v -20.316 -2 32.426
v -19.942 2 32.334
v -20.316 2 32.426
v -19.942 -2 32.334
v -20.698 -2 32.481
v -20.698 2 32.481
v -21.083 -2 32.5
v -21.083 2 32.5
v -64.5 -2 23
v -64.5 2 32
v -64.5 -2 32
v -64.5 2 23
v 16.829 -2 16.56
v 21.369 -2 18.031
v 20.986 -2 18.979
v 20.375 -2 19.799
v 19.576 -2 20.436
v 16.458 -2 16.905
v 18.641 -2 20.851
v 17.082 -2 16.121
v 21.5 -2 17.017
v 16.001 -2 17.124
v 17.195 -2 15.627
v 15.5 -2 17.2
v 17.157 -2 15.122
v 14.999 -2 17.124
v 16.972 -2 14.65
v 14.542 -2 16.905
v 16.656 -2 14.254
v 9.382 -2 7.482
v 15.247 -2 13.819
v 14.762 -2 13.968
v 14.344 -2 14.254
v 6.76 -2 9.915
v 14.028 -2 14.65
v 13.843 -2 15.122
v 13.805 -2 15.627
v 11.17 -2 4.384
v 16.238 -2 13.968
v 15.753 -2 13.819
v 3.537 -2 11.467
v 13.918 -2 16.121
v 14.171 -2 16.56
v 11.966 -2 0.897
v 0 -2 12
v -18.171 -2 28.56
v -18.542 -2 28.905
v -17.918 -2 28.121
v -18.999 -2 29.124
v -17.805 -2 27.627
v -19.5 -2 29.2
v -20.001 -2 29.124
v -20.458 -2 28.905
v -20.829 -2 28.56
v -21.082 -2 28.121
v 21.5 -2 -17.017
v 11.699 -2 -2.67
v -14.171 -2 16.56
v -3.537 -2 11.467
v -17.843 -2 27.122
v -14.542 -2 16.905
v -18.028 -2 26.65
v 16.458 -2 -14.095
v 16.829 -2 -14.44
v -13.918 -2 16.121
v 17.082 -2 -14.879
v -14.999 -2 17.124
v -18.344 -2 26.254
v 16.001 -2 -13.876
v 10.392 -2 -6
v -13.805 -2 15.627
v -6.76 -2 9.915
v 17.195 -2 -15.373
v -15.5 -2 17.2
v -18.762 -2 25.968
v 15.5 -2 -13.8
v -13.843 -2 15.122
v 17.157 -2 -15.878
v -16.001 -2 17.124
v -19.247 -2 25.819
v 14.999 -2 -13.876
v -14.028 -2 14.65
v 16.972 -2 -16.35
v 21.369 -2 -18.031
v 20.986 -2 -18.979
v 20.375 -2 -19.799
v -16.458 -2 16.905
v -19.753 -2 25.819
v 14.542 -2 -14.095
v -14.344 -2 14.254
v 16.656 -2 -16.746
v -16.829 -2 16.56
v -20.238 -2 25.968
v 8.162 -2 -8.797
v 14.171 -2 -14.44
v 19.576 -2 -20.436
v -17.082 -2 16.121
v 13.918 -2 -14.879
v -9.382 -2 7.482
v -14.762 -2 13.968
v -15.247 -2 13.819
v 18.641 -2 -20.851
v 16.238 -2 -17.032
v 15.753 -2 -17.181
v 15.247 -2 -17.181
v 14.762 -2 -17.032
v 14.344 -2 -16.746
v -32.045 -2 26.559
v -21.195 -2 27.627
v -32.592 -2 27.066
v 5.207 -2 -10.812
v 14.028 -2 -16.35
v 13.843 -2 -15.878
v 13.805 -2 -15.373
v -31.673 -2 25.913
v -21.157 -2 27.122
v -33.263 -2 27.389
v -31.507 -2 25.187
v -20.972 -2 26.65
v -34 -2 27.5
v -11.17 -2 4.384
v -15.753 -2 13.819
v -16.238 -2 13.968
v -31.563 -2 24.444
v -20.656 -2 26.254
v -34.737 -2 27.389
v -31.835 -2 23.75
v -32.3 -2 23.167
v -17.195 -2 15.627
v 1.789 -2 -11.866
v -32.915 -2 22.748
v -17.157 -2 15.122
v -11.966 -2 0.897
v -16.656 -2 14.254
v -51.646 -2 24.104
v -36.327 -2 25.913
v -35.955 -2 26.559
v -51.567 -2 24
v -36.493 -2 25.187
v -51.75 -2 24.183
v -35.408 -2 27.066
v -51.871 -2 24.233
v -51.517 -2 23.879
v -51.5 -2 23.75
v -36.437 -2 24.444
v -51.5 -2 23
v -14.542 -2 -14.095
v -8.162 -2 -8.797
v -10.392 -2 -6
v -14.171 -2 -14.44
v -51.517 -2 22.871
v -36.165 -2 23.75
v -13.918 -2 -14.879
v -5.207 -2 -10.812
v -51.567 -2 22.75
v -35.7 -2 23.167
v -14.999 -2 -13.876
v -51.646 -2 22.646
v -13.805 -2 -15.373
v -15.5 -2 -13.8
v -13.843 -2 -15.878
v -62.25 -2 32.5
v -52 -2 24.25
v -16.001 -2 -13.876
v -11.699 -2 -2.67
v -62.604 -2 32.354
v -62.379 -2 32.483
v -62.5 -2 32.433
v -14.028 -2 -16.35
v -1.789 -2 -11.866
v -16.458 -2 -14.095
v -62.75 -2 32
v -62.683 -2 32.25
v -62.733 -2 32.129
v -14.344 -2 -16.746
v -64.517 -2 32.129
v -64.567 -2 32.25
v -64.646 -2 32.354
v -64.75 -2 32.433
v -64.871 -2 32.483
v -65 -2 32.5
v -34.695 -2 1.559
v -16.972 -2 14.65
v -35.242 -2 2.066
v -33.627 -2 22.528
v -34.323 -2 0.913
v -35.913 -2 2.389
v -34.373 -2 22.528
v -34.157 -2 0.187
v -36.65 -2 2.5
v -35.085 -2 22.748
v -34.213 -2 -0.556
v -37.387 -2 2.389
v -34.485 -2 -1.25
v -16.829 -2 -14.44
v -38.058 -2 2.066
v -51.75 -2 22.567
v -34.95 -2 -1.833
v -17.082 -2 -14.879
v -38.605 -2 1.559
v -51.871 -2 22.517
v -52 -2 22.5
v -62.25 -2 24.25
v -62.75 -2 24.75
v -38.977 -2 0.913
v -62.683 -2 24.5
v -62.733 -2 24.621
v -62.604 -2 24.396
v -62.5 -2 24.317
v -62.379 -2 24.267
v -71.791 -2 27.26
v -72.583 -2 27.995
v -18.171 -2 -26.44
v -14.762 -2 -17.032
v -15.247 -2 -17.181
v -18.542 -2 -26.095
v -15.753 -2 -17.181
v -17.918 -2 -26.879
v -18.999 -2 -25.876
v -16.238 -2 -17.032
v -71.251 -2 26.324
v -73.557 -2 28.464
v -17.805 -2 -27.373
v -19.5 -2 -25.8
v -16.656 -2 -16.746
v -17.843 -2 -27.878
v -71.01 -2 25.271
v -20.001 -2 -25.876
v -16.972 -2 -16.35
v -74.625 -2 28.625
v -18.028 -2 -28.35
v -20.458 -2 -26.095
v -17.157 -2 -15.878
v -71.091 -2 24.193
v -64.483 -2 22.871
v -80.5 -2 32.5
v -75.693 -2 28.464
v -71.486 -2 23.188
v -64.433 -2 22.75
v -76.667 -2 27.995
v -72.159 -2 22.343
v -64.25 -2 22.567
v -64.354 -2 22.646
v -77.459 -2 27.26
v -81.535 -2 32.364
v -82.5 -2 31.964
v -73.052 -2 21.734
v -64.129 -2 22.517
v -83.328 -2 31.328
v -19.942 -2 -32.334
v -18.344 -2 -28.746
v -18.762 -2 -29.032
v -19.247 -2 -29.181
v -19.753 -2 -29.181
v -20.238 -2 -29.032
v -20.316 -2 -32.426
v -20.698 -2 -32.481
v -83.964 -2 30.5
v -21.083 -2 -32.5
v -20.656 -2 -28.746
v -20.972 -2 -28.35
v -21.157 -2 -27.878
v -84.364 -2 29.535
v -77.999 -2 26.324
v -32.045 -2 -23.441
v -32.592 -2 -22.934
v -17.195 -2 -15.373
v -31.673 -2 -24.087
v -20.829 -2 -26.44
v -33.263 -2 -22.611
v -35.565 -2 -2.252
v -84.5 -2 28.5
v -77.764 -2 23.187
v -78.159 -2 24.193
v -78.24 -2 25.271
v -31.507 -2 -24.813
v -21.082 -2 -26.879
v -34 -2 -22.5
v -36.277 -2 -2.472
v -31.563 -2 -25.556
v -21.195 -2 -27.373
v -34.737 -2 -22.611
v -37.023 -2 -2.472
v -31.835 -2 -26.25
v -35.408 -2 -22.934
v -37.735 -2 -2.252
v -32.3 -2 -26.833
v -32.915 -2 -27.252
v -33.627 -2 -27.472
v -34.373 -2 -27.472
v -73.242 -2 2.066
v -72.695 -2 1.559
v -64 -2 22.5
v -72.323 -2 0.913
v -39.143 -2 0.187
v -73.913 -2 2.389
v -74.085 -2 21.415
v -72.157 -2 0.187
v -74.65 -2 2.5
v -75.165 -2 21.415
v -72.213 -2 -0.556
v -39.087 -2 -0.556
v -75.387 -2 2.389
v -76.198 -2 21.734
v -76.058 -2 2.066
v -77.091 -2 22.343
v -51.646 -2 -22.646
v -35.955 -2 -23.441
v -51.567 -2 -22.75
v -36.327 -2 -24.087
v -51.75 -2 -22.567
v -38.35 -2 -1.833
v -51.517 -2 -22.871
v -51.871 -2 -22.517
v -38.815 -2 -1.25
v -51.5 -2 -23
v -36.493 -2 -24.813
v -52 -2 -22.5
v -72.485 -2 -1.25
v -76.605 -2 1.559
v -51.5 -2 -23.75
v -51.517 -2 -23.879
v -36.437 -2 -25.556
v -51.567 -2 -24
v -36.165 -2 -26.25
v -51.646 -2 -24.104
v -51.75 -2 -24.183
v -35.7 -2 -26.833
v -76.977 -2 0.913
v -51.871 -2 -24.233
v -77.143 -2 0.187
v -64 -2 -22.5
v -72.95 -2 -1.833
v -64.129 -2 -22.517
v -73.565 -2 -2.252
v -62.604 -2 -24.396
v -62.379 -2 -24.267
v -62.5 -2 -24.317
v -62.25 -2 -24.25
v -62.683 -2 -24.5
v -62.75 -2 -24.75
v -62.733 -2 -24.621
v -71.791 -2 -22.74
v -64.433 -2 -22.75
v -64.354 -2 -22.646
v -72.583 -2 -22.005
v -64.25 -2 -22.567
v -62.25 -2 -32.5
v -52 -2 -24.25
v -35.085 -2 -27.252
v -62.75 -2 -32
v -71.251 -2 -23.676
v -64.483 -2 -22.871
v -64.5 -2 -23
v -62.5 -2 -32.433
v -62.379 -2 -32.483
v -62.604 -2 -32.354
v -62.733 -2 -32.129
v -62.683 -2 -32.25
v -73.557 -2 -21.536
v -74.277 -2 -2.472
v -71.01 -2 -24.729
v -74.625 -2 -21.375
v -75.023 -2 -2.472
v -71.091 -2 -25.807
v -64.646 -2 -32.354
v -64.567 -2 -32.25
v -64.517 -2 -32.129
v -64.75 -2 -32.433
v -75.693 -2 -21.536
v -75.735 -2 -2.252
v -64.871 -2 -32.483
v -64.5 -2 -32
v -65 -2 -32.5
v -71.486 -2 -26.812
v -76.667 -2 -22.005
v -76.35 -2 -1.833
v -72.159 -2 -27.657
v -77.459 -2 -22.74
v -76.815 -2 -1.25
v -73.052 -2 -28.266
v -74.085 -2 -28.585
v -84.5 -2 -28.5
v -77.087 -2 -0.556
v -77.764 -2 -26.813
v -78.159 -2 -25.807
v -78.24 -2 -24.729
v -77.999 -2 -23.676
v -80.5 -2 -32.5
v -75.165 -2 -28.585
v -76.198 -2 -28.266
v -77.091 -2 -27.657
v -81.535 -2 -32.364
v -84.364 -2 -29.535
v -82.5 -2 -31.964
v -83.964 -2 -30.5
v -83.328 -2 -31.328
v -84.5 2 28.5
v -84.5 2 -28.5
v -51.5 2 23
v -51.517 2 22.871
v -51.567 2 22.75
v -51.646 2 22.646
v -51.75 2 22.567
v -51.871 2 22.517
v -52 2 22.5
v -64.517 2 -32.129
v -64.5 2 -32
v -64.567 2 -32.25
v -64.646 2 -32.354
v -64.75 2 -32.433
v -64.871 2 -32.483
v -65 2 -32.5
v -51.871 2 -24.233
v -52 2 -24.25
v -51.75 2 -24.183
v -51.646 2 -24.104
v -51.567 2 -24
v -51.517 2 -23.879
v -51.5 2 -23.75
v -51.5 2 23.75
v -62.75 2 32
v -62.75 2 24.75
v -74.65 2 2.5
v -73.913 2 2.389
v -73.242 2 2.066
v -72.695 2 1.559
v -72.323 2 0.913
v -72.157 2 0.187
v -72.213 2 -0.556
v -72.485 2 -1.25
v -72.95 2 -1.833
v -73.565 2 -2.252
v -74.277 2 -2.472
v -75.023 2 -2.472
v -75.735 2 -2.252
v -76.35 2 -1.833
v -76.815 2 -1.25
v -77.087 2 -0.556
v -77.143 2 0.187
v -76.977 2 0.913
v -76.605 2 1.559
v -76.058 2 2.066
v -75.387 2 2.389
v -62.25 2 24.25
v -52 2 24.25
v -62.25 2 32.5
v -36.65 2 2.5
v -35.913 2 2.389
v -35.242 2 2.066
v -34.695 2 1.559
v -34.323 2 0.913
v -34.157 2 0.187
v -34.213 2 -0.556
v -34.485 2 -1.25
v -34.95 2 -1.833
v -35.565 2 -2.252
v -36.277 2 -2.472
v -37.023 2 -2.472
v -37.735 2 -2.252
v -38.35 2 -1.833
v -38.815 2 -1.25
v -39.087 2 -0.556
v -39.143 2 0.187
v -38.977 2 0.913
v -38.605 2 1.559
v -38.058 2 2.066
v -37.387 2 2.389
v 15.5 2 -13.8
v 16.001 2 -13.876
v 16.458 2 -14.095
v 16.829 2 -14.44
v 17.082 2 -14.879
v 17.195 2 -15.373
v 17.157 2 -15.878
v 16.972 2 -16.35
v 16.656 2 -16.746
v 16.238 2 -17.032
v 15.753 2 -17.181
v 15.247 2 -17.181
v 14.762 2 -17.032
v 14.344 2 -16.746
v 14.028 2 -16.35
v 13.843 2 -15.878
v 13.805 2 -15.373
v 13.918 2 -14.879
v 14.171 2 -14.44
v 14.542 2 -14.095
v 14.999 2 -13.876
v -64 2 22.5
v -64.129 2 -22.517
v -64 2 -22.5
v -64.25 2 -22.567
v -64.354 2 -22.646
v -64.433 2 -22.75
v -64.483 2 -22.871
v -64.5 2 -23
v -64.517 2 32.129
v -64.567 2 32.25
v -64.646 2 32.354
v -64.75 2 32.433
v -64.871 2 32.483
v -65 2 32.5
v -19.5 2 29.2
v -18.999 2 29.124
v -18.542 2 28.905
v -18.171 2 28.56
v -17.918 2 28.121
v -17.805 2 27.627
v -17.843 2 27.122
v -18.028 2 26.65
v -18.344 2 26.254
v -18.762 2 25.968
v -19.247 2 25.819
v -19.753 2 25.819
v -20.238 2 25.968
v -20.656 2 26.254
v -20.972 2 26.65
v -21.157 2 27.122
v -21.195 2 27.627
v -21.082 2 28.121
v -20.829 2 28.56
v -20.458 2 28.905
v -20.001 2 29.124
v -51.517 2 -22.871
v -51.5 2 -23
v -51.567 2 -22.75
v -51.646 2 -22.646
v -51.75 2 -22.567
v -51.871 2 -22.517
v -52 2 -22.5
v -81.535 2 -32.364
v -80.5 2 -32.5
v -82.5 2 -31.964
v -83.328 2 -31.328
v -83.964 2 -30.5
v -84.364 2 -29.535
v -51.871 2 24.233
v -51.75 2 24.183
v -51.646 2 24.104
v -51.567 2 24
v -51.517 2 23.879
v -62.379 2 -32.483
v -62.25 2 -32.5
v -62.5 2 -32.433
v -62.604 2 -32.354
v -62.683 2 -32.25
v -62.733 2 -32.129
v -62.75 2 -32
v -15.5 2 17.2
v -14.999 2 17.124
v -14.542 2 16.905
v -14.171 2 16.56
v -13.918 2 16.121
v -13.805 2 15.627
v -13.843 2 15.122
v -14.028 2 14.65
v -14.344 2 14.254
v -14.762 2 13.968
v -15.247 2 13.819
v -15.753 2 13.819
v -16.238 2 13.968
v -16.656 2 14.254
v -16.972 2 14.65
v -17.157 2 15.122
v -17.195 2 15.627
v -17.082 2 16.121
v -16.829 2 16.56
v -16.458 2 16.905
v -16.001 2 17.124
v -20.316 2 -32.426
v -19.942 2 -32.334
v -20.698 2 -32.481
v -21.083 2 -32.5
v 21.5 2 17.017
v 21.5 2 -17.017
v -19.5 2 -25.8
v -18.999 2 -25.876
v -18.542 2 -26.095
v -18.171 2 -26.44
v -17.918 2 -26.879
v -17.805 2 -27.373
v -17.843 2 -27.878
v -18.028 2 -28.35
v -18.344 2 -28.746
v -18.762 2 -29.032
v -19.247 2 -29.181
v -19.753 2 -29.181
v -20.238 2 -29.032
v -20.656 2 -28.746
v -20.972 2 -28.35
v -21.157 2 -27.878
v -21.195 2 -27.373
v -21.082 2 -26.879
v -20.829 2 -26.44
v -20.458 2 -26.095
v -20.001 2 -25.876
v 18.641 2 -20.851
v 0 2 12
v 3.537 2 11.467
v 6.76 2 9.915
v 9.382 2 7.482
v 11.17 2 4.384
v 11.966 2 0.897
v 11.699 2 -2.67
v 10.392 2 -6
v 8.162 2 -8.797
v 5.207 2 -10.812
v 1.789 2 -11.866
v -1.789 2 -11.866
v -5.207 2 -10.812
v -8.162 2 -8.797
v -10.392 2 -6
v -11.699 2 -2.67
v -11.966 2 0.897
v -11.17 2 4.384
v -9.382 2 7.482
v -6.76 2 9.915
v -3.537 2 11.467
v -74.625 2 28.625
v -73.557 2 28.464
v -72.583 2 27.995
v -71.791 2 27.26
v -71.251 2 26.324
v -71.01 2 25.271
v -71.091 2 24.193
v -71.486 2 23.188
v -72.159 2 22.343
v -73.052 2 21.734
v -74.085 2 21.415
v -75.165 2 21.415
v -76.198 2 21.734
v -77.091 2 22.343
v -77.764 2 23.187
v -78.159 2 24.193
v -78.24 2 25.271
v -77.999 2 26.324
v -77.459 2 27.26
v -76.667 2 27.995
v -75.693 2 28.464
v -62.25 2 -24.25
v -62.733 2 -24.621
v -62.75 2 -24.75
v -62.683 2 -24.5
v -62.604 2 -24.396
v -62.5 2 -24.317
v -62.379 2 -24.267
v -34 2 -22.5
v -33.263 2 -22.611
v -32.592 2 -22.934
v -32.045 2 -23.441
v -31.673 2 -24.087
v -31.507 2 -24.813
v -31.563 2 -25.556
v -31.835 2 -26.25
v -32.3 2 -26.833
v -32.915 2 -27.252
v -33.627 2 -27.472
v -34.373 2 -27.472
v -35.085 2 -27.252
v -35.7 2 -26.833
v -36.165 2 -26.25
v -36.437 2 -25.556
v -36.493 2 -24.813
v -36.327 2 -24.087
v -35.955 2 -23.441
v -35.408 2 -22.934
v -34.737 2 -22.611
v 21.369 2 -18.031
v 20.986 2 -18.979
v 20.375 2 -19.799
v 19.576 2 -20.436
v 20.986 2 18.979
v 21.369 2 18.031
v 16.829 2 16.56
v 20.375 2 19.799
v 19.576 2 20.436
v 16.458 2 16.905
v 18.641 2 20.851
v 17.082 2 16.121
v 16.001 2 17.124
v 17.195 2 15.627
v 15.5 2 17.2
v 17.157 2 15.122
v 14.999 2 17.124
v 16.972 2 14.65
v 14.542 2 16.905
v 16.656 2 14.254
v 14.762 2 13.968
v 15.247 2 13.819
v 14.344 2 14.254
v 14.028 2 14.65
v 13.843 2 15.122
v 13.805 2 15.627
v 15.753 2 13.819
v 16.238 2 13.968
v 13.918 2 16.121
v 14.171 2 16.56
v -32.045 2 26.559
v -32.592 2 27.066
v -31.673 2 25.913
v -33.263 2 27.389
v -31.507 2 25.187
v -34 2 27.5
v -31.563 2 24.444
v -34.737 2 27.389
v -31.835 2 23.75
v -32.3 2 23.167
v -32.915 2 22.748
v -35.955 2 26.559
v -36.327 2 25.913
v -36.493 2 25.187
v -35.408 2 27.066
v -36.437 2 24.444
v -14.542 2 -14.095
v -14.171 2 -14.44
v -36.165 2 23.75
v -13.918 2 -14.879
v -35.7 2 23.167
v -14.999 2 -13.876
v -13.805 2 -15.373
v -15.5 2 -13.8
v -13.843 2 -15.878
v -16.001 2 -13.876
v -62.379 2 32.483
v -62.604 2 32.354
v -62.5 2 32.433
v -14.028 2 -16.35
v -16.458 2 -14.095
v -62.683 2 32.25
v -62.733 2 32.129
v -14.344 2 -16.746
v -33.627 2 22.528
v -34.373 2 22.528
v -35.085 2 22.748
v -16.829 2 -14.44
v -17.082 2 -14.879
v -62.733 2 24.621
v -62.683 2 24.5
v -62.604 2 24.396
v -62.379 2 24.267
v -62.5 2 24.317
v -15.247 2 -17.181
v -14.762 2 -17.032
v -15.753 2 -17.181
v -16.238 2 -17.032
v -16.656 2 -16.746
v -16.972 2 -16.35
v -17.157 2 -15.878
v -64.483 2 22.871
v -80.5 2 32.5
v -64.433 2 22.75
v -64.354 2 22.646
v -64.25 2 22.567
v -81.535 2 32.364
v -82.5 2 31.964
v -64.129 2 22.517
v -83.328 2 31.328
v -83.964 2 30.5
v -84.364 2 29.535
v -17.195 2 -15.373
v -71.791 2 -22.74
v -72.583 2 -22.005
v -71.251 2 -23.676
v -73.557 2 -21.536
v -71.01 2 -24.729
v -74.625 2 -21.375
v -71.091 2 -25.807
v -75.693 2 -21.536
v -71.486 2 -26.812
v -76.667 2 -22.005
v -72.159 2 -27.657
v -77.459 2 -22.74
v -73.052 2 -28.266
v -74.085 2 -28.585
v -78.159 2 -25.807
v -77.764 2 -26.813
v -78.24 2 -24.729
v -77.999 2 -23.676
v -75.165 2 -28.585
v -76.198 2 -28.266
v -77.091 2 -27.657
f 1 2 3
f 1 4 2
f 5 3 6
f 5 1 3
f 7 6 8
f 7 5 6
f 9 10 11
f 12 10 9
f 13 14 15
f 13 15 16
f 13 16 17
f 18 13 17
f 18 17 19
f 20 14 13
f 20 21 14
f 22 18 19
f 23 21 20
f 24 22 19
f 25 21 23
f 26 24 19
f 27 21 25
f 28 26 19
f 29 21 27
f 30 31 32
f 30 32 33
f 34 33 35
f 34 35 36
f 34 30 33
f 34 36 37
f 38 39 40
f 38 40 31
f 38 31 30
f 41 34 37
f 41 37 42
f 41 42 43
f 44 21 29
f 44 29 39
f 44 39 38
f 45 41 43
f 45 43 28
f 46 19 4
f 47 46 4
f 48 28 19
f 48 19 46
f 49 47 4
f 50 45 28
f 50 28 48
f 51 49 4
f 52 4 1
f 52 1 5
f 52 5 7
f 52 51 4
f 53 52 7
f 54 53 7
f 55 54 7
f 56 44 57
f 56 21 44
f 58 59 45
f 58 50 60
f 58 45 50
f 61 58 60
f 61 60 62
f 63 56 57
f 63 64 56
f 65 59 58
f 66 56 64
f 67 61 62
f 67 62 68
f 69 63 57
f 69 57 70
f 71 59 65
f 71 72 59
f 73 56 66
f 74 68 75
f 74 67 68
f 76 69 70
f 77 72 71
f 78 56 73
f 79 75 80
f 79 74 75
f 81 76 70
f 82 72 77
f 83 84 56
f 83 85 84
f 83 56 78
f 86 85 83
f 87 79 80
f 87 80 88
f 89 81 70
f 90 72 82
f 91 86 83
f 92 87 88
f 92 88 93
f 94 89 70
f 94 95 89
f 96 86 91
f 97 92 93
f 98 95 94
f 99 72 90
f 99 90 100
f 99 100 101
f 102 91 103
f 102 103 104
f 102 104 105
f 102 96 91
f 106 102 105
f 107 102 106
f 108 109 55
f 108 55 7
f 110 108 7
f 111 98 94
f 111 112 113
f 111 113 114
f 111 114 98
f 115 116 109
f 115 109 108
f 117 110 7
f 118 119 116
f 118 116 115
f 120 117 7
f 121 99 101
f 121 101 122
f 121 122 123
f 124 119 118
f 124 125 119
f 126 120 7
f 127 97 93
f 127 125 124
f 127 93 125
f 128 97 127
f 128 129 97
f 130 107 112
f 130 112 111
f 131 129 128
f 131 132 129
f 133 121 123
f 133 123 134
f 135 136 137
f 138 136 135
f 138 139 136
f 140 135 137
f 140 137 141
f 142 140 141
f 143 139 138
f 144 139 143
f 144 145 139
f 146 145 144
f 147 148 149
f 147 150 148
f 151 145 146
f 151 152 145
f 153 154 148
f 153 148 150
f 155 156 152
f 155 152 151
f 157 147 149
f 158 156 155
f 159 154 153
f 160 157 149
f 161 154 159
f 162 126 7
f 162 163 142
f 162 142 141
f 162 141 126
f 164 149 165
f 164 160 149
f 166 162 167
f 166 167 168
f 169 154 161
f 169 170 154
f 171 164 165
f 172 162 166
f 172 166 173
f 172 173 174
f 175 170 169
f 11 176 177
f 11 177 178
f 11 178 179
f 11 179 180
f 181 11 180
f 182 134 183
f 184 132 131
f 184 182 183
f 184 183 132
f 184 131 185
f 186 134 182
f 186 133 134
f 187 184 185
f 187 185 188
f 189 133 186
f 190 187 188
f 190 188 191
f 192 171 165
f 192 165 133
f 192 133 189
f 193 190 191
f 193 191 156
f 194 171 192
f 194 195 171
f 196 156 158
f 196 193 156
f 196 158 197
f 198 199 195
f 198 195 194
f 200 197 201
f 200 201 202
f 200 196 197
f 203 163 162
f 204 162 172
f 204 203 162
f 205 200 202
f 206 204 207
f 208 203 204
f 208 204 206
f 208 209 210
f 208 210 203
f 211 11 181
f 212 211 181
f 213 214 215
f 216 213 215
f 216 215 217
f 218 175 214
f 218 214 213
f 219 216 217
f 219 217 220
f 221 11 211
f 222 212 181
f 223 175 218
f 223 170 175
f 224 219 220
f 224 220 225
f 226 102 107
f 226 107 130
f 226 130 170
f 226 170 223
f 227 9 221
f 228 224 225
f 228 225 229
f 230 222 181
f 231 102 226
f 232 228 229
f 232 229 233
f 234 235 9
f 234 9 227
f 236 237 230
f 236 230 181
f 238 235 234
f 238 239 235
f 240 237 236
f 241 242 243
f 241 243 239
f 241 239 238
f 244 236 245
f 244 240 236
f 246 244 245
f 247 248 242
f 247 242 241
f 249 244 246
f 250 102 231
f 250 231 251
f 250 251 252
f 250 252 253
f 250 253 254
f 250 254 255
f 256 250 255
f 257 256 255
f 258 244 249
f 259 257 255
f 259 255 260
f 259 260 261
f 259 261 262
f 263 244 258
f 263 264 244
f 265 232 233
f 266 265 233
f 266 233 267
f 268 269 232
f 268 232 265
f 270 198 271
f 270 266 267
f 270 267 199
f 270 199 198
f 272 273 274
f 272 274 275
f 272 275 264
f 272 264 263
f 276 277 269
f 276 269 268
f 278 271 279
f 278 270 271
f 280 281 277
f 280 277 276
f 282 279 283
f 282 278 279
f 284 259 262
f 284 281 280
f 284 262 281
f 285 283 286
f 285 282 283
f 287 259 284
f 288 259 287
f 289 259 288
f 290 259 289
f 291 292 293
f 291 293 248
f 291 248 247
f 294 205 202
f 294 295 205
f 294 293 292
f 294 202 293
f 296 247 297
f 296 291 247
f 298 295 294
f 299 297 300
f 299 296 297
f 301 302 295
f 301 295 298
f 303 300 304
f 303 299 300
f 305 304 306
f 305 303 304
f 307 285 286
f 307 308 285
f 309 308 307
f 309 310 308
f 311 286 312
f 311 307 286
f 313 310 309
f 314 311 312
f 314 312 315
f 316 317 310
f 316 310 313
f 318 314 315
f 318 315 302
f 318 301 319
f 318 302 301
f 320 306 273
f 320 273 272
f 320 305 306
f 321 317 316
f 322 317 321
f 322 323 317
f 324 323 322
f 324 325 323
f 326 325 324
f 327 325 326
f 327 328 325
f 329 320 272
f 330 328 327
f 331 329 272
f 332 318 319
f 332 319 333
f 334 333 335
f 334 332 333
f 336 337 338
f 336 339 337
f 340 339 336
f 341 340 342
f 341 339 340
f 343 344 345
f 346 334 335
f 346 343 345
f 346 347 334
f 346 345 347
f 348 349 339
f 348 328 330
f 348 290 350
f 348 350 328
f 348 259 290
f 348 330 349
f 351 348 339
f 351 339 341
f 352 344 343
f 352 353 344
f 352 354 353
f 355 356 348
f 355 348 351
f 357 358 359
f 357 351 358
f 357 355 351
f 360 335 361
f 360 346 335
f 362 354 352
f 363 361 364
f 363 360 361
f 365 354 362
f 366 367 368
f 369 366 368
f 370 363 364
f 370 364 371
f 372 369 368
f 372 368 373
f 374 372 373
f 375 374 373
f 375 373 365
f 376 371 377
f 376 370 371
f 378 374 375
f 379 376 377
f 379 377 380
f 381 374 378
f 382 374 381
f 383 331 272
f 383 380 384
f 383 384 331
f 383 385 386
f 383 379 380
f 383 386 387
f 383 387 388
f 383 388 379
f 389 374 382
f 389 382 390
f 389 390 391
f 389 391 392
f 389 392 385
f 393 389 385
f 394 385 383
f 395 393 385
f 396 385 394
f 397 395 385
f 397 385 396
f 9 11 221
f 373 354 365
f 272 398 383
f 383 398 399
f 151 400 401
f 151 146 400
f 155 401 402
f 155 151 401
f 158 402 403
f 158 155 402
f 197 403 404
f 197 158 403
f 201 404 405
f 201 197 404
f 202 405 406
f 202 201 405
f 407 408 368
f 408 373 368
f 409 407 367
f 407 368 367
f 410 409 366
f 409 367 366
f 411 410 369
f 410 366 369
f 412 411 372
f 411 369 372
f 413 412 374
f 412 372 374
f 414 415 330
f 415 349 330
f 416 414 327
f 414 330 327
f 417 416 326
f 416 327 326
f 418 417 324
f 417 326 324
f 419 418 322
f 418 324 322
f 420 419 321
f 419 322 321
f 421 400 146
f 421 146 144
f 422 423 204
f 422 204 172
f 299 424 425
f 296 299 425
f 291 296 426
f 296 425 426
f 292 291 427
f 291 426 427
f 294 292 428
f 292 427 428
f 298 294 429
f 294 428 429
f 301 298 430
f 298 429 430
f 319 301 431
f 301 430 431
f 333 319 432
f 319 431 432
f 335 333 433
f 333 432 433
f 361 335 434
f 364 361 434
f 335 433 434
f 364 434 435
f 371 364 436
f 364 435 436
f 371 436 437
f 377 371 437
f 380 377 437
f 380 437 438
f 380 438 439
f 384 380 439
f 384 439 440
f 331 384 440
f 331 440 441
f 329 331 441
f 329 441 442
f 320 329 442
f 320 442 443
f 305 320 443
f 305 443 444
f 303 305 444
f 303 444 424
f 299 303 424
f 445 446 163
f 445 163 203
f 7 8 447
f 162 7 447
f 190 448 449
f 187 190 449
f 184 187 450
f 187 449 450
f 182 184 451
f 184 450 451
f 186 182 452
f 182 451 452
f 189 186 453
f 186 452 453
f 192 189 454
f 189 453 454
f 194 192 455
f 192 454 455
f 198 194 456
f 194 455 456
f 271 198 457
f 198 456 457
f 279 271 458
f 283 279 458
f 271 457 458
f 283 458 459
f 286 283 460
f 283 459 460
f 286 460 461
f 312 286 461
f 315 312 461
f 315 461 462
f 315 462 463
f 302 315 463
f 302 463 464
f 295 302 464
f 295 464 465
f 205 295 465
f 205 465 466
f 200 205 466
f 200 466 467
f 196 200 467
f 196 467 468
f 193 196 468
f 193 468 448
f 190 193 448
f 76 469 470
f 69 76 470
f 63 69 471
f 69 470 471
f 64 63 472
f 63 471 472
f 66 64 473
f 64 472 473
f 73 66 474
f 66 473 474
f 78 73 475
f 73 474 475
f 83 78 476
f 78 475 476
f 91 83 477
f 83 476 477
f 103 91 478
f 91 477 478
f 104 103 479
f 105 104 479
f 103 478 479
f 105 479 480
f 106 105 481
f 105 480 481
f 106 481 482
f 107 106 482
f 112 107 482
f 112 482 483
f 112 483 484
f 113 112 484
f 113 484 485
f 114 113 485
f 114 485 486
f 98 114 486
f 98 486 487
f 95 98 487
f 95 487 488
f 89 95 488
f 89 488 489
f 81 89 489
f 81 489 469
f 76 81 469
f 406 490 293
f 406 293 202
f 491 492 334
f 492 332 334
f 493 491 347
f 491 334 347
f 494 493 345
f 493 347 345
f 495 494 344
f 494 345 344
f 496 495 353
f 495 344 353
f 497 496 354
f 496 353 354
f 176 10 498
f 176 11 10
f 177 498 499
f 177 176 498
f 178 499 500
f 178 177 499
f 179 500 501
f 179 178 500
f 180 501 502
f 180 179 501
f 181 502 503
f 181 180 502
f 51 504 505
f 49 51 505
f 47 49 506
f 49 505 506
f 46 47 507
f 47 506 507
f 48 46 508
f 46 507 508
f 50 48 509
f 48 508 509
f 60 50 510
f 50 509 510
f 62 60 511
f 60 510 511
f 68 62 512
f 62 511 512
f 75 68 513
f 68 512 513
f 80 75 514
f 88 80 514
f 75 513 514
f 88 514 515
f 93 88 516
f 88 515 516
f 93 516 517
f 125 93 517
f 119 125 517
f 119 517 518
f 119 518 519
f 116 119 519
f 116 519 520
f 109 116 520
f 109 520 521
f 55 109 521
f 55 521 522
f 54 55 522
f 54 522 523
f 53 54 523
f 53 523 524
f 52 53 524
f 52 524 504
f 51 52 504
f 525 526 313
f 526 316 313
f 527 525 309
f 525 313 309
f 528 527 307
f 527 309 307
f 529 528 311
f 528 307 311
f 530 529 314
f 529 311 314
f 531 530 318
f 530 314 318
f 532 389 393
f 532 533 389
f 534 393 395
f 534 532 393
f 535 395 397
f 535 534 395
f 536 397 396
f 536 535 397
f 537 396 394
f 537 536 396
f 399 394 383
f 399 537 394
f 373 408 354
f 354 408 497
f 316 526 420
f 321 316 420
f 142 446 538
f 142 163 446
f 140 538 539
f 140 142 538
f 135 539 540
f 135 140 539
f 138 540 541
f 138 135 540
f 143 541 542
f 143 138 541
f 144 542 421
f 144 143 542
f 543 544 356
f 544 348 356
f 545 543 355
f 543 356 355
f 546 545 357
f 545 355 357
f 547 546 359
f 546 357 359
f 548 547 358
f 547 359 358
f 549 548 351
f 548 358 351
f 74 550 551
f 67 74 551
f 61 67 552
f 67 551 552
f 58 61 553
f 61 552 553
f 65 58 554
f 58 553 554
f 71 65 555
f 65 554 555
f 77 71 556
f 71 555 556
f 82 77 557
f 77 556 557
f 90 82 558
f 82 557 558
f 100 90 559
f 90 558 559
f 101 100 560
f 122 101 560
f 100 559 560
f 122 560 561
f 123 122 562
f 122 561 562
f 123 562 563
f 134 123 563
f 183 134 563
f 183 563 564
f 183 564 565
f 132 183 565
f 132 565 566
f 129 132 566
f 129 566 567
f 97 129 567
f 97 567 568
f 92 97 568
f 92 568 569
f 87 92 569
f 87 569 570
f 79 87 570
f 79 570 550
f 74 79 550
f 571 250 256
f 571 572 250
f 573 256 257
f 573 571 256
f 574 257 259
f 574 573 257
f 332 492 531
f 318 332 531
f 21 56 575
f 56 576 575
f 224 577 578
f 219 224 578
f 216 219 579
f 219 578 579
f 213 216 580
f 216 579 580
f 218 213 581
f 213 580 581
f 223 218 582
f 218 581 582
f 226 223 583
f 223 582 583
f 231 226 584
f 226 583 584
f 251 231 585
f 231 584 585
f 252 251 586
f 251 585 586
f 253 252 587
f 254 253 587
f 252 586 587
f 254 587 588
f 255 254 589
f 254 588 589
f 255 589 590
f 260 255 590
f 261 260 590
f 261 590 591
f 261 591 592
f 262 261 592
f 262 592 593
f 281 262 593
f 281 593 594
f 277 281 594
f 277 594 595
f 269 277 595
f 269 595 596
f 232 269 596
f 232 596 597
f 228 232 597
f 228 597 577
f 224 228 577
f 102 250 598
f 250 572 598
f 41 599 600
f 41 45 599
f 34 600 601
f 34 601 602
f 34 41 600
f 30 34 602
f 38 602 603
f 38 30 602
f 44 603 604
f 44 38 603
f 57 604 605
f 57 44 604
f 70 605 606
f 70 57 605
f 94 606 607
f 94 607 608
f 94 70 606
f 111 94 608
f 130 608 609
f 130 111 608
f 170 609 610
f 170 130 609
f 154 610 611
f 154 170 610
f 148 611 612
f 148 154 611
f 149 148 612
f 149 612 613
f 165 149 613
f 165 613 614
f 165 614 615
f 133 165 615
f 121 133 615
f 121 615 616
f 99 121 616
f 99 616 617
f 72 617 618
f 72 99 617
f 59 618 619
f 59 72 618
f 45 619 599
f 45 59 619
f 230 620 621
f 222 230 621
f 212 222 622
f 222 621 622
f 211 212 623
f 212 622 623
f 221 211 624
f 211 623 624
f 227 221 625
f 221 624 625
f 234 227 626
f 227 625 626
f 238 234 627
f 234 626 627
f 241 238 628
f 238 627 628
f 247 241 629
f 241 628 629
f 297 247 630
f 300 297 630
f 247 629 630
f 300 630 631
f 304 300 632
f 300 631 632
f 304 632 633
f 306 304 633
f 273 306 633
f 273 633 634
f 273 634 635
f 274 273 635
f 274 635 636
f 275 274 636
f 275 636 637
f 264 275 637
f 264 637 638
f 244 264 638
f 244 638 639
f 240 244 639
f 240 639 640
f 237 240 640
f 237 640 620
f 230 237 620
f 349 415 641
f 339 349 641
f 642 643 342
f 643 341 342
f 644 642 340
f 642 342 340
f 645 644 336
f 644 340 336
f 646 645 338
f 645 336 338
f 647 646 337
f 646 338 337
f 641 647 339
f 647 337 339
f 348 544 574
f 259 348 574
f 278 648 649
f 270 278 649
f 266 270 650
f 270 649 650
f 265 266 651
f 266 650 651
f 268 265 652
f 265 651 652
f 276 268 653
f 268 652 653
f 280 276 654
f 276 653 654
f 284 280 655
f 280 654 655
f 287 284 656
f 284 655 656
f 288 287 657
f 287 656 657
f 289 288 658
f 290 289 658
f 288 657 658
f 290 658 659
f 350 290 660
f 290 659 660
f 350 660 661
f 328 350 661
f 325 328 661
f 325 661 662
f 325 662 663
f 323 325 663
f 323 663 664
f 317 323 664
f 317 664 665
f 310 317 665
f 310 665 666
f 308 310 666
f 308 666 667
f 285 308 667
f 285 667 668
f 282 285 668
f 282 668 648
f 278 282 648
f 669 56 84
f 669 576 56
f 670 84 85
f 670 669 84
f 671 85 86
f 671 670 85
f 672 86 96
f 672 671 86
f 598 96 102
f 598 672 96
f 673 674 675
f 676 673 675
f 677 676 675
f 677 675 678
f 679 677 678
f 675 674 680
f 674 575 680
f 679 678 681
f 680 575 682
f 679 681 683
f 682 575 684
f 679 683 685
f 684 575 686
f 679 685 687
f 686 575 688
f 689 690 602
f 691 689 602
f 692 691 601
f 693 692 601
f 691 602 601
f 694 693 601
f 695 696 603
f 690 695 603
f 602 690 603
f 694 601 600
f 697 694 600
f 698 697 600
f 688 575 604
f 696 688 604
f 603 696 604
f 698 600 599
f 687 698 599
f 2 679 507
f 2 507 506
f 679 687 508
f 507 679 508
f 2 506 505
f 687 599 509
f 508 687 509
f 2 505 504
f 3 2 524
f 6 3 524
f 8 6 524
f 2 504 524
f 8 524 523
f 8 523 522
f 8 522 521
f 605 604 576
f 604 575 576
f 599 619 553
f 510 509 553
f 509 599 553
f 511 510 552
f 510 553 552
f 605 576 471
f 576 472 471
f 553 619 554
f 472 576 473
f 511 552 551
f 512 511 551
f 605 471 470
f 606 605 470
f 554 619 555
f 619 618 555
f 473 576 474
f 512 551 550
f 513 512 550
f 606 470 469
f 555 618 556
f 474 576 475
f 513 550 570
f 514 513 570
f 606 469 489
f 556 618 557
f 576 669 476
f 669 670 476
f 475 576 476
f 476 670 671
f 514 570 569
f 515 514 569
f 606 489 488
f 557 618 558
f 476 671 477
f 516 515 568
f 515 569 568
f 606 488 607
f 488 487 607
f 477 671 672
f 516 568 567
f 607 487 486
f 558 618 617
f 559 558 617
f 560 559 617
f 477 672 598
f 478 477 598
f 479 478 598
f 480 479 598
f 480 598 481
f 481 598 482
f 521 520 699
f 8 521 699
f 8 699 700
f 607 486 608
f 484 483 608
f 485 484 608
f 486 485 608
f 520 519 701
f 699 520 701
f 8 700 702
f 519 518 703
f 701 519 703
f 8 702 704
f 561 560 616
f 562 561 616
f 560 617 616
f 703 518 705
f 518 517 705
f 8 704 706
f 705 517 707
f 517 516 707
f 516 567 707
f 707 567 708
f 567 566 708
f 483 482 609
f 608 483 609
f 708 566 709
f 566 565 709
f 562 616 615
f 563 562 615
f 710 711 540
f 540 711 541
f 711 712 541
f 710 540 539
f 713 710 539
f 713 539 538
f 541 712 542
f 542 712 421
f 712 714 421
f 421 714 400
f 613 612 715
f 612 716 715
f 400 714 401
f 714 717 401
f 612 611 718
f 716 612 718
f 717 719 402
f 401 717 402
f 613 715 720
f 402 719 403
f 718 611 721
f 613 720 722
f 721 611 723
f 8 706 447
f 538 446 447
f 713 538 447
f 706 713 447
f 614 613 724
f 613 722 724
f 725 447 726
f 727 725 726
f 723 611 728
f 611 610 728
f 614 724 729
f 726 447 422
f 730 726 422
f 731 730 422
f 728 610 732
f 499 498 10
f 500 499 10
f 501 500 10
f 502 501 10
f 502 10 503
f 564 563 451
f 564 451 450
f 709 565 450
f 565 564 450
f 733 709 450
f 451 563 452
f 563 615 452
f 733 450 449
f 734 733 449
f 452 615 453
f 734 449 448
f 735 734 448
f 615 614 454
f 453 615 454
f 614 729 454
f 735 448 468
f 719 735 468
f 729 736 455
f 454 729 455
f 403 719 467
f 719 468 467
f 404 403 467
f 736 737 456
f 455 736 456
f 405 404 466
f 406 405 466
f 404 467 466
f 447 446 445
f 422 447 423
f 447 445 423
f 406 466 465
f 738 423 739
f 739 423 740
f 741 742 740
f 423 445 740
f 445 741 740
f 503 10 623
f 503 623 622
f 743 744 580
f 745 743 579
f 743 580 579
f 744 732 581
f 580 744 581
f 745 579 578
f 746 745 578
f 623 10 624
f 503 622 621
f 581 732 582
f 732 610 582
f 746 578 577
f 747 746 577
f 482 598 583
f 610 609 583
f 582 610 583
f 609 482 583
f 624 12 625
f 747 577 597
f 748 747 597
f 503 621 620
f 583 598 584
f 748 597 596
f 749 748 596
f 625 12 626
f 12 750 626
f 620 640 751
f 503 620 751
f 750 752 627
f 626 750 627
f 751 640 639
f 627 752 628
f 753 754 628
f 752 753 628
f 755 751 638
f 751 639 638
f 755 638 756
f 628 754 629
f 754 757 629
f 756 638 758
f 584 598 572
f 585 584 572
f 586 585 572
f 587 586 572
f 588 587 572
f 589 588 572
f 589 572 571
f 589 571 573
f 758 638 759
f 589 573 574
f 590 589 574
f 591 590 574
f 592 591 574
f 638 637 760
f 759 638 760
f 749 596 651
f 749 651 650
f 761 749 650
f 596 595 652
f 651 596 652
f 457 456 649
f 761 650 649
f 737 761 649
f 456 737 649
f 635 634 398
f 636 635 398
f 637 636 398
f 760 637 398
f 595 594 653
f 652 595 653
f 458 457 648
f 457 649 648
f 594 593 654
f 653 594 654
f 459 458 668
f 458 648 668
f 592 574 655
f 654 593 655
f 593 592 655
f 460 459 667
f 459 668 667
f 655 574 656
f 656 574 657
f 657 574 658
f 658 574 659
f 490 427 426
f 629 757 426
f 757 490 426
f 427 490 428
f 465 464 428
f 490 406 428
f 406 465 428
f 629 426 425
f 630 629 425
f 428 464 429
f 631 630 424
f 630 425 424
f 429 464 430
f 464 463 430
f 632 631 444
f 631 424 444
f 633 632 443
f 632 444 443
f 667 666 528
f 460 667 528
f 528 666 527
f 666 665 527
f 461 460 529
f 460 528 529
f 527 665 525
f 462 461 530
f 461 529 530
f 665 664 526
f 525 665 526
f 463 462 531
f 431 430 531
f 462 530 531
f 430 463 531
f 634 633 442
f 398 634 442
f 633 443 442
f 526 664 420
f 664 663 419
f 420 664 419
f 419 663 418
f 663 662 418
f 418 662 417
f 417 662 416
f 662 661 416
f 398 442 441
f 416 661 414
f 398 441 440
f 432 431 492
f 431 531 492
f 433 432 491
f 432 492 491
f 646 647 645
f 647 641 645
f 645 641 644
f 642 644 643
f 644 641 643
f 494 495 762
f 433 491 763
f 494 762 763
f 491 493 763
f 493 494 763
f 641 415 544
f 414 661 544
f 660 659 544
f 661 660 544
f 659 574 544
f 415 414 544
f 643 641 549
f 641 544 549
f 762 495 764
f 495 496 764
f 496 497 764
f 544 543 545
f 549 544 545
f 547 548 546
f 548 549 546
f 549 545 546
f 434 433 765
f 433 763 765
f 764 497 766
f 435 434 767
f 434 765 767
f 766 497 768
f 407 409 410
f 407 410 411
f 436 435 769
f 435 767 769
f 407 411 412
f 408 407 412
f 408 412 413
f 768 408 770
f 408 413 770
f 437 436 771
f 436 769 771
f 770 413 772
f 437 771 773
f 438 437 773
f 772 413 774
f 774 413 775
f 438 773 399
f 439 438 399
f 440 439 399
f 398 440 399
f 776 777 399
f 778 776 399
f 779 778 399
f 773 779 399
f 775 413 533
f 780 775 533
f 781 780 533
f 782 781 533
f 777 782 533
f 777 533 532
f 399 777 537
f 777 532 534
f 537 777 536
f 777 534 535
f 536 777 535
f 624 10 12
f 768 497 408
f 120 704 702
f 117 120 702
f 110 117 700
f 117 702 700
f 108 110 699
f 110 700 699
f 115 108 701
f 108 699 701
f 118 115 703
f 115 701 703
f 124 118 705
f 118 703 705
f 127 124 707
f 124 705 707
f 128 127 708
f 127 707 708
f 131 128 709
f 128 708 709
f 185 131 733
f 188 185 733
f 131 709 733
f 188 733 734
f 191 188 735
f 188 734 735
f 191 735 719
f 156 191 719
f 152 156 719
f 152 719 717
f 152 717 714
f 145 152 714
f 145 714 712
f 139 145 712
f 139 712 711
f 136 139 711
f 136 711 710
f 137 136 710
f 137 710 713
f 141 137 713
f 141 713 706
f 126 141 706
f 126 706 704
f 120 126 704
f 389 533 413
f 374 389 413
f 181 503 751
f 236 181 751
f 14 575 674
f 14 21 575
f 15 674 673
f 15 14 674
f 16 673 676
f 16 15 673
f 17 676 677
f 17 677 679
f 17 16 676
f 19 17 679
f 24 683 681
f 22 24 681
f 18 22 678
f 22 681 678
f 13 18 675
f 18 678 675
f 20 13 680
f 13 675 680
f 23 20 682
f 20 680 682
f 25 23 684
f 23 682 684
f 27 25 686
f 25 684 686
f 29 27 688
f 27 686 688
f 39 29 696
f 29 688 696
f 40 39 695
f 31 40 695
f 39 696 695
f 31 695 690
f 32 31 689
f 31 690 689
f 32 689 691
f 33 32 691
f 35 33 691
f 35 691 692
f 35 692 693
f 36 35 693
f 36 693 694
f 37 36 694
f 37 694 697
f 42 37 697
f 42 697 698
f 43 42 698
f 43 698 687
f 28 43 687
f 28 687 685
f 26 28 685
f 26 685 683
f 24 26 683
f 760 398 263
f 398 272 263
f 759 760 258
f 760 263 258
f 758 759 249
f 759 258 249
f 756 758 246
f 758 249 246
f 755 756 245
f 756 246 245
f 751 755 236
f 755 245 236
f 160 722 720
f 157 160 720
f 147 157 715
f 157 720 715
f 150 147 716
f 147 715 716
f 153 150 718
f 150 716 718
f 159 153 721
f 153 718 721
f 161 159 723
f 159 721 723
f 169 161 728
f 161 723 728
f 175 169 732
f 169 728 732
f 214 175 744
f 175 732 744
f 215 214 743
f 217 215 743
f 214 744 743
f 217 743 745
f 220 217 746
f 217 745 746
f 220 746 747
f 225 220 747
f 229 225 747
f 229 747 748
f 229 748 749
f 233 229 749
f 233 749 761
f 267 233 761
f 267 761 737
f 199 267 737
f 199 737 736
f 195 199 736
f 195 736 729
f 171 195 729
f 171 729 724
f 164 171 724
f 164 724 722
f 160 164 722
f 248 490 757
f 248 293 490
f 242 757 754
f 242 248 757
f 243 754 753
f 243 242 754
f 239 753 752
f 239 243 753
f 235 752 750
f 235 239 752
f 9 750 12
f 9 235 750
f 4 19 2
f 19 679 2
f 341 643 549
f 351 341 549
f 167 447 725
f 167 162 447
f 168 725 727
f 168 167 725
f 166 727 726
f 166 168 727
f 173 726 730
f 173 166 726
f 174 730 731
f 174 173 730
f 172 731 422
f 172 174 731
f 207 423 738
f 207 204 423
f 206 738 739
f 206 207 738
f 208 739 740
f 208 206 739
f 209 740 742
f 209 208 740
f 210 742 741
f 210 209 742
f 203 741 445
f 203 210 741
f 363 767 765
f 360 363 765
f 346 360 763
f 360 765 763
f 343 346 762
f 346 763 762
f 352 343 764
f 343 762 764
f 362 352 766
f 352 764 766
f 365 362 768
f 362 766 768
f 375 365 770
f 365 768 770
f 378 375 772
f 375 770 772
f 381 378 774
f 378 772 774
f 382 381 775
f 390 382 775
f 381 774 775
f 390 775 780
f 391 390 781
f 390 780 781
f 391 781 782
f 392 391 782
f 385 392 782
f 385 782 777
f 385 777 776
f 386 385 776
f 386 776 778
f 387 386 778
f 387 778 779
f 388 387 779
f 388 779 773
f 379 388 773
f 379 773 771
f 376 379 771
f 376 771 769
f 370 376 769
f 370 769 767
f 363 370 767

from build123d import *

# Parameters (mm, degrees)
SKETCH1_R           = 12
BOSS_EXTRUDE1_DEPTH = 2
SKETCH2_R           = 1.7
CUT_EXTRUDE1_DEPTH  = 91.622844802
SKETCH3_R           = 2.5
SKETCH3_R_2         = 3.625
CUT_EXTRUDE2_DEPTH  = 91.622844802
CUT_EXTRUDE3_DEPTH  = 91.622844802
FILLET1_R           = 4
FILLET2_R           = 0.5


with BuildPart() as part:
    # Sketch1 → Boss-Extrude1 (new, symmetric)
    with BuildSketch(Plane(origin=(0, 0, 0), x_dir=(1, 0, 0), z_dir=(0, 1, 0))):
        Polygon((21.5, 20), (21.5, -20), (-20.5, -32.5), (-84.5, -32.5), (-84.5, 32.5), (-20.5, 32.5), align=None)
        with Locations(Location((0, 0, 0), (0, 0, 270))):
            Circle(SKETCH1_R, mode=Mode.SUBTRACT)
    extrude(amount=BOSS_EXTRUDE1_DEPTH, both=True)

    # Sketch2 → Cut-Extrude1 (cut, through all)
    with BuildSketch(Plane(origin=(0, 2, 0), x_dir=(1, 0, 0), z_dir=(0, 1, 0))):
        with Locations(Location((15.5, 15.5, 0), (0, 0, 270))):
            Circle(SKETCH2_R)
        with Locations(Location((-15.5, 15.5, 0), (0, 0, 270))):
            Circle(SKETCH2_R)
        with Locations(Location((-15.5, -15.5, 0), (0, 0, 270))):
            Circle(SKETCH2_R)
        with Locations(Location((15.5, -15.5, 0), (0, 0, 270))):
            Circle(SKETCH2_R)
        with Locations(Location((-19.5, 27.5, 0), (0, 0, 270))):
            Circle(SKETCH2_R)
        with Locations(Location((-19.5, -27.5, 0), (0, 0, 270))):
            Circle(SKETCH2_R)
    extrude(amount=-CUT_EXTRUDE1_DEPTH, mode=Mode.SUBTRACT)

    # Sketch3 → Cut-Extrude2 (cut, through all)
    with BuildSketch(Plane(origin=(0, 2, 0), x_dir=(1, 0, 0), z_dir=(0, 1, 0))):
        with Locations(Location((-74.65, 0, 0), (0, 0, 270))):
            Circle(SKETCH3_R)
        with Locations(Location((-36.65, 0, 0), (0, 0, 270))):
            Circle(SKETCH3_R)
        with Locations(Location((-34, 25, 0), (0, 0, 270))):
            Circle(SKETCH3_R)
        with Locations(Location((-34, -25, 0), (0, 0, 270))):
            Circle(SKETCH3_R)
        with Locations(Location((-74.625, 25, 0), (0, 0, 270))):
            Circle(SKETCH3_R_2)
        with Locations(Location((-74.625, -25, 0), (0, 0, 270))):
            Circle(SKETCH3_R_2)
    extrude(amount=-CUT_EXTRUDE2_DEPTH, mode=Mode.SUBTRACT)

    # Sketch4 → Cut-Extrude3 (cut, through all)
    with BuildSketch(Plane(origin=(0, 2, 0), x_dir=(1, 0, 0), z_dir=(0, 1, 0))):
        Polygon((-64.5, 32.5), (-64.5, 22.5), (-51.5, 22.5), (-51.5, 24.25), (-62.75, 24.25), (-62.75, 32.5), align=None)
        Polygon((-62.75, -24.25), (-62.75, -32.5), (-64.5, -32.5), (-64.5, -22.5), (-51.5, -22.5), (-51.5, -24.25), align=None)
    extrude(amount=-CUT_EXTRUDE3_DEPTH, mode=Mode.SUBTRACT)

    # Fillet1
    fillet1_edges = [part.edges().sort_by_distance(p)[0] for p in [
        (-20.5, 0, 32.5),
        (-84.5, 0, 32.5),
        (-84.5, 0, -32.5),
        (-20.5, 0, -32.5),
        (21.5, 0, -20),
        (21.5, 0, 20),
    ]]
    fillet(fillet1_edges, radius=FILLET1_R)

    # Fillet2
    fillet2_edges = [part.edges().sort_by_distance(p)[0] for p in [
        (-62.75, 0, 24.25),
        (-62.75, 0, 32.5),
        (-64.5, 0, 32.5),
        (-64.5, 0, 22.5),
        (-51.5, 0, 22.5),
        (-64.5, 0, -32.5),
        (-62.75, 0, -32.5),
        (-62.75, 0, -24.25),
        (-51.5, 0, -24.25),
        (-51.5, 0, -22.5),
        (-64.5, 0, -22.5),
        (-51.5, 0, 24.25),
    ]]
    fillet(fillet2_edges, radius=FILLET2_R)


solid = part.part
